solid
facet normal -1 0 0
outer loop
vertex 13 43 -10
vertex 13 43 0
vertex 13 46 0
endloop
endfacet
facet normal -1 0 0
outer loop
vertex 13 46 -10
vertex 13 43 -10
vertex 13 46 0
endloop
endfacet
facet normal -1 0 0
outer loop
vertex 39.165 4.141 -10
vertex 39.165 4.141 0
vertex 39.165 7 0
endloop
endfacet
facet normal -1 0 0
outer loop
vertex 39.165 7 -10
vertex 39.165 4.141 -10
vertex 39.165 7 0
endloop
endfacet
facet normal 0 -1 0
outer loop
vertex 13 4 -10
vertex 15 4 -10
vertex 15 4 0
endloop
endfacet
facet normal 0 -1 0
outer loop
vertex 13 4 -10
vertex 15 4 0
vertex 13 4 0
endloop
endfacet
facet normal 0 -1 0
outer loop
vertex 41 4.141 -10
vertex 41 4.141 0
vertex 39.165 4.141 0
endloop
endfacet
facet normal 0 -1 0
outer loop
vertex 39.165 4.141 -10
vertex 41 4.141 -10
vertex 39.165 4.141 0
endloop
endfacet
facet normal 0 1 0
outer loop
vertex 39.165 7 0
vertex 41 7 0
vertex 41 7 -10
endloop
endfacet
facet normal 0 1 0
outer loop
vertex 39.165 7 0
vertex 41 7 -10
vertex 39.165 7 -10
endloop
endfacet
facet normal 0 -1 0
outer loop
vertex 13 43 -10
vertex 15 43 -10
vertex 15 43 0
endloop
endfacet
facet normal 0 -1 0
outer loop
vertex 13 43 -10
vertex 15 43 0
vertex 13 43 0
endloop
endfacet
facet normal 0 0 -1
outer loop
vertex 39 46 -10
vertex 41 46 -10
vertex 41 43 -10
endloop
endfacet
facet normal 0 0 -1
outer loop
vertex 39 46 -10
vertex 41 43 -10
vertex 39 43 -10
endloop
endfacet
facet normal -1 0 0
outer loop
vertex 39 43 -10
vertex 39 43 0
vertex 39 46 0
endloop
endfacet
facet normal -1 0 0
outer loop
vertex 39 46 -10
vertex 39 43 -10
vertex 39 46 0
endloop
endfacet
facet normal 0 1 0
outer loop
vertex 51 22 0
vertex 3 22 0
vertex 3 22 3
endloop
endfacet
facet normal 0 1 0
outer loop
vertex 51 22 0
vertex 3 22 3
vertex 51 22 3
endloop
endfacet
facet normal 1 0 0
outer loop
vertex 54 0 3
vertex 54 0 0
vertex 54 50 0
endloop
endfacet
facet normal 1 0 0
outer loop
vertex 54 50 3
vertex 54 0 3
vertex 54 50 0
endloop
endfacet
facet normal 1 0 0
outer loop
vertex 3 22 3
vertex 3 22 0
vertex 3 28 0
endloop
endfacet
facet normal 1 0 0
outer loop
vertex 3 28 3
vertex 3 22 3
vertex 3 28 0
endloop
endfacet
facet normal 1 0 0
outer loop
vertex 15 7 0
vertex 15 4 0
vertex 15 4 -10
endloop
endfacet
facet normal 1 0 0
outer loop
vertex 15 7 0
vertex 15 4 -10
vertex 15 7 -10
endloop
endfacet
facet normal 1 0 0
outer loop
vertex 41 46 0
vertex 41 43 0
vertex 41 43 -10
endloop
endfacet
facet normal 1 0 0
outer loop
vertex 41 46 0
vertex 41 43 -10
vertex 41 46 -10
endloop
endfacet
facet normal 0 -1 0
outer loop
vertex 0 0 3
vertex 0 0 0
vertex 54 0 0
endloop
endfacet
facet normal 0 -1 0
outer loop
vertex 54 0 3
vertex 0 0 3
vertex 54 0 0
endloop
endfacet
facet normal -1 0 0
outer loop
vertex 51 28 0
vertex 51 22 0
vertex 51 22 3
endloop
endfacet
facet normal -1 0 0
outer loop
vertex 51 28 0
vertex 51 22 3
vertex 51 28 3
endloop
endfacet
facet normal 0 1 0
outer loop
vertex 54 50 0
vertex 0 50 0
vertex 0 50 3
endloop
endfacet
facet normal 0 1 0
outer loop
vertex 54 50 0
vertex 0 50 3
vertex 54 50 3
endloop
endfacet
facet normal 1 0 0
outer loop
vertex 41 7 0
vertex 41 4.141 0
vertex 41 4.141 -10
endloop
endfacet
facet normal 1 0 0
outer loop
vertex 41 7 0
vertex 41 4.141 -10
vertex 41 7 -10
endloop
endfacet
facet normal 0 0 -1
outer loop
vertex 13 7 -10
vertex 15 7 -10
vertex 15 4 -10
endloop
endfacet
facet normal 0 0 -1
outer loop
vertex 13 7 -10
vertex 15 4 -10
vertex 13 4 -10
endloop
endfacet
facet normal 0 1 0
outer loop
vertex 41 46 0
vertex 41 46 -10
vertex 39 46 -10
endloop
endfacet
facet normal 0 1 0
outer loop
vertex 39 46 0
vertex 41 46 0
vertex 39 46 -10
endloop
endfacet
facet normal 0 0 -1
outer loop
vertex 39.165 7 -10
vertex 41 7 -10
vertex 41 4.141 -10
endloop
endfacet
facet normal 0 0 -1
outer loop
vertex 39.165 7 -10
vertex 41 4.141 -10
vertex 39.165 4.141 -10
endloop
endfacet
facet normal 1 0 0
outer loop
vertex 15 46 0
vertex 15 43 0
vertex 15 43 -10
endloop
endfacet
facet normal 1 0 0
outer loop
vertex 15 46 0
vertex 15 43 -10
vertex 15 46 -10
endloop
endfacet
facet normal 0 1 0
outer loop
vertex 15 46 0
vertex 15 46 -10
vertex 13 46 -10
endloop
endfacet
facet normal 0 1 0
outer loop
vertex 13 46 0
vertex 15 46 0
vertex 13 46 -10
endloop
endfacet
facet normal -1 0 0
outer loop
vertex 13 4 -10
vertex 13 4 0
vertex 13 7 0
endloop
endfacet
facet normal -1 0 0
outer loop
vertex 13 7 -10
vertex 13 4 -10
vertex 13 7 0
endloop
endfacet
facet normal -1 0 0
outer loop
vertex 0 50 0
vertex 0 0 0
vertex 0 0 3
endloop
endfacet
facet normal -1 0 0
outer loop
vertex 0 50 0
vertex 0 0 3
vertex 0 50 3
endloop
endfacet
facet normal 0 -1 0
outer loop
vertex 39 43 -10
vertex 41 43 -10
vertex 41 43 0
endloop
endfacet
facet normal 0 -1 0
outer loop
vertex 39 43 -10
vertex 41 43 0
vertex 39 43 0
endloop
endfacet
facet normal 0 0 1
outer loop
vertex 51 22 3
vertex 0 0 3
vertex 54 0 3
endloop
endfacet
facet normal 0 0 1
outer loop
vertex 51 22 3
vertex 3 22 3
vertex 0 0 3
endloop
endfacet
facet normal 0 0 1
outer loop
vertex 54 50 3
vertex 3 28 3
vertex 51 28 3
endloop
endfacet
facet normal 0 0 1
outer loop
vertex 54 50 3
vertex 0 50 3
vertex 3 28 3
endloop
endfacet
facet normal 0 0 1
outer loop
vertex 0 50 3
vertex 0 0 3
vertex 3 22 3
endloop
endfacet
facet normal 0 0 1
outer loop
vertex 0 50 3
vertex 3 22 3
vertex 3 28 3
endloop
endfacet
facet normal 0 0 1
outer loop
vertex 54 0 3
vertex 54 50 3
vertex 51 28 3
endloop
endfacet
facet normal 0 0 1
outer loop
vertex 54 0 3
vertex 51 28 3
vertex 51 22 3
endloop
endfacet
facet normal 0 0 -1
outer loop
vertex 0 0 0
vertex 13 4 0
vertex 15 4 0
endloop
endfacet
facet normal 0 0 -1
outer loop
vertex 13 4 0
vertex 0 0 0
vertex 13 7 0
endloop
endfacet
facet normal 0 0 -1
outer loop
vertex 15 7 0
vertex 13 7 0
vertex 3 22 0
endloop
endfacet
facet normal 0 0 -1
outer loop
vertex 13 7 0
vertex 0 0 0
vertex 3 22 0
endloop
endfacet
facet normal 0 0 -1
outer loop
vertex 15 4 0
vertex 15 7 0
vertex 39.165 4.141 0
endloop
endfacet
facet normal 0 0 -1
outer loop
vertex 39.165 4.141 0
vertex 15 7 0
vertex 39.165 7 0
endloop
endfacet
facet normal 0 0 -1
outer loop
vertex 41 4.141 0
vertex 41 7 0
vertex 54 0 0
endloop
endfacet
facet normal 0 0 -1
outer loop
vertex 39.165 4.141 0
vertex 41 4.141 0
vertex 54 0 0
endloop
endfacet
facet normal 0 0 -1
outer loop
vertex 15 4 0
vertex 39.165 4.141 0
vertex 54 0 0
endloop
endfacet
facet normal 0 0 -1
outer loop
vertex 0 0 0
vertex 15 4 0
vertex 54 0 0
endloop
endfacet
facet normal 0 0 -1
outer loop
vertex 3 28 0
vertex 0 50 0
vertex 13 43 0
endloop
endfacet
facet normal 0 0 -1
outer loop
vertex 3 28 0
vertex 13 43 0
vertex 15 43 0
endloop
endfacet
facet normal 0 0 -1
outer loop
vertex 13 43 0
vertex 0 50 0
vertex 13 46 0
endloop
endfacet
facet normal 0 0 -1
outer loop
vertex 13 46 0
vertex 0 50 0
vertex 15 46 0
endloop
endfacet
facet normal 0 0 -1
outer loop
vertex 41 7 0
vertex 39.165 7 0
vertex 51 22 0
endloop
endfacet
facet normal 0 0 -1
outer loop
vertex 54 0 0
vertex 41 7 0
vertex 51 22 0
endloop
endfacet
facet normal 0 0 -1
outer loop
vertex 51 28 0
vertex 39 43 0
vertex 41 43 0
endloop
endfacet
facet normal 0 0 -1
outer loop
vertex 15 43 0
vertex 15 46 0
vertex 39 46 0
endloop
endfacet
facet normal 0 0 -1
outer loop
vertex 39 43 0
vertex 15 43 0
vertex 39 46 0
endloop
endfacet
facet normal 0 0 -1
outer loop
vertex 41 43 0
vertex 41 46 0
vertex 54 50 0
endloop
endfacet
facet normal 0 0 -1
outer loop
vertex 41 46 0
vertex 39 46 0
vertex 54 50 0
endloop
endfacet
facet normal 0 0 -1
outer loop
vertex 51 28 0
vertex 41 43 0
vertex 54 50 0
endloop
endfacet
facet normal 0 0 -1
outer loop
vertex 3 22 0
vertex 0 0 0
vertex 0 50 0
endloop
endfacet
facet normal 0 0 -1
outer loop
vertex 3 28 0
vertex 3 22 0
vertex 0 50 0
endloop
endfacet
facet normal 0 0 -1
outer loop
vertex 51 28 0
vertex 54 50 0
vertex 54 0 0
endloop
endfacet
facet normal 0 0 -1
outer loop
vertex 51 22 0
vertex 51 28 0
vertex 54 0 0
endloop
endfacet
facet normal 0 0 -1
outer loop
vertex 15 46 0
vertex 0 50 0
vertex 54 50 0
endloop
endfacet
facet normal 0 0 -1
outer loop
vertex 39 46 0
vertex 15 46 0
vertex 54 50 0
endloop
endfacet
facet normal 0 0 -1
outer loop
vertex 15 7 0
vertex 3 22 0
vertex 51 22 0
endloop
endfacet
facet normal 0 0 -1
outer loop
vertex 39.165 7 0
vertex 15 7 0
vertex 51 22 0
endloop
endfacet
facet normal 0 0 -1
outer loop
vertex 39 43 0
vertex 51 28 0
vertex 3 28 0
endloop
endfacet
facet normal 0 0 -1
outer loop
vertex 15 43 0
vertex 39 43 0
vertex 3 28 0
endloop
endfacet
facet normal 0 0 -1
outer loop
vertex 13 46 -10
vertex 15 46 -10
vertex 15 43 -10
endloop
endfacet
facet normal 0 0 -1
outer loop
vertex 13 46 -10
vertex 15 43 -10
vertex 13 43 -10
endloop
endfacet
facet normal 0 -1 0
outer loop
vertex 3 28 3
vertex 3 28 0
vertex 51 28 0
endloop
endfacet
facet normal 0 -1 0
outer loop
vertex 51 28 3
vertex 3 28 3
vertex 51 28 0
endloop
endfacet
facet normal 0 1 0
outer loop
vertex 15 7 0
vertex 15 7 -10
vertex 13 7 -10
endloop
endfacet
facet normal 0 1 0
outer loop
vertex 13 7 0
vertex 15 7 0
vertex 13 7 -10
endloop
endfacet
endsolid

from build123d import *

# Parameters (mm, degrees)
SKETCH1_W           = 54
SKETCH1_H           = 50
SKETCH1_W_2         = 48
SKETCH1_H_2         = 6
BOSS_EXTRUDE1_DEPTH = 3
SKETCH2_W           = 2
SKETCH2_H           = 3
SKETCH2_W_2         = 1.834512626
SKETCH2_H_2         = 2.85876986
BOSS_EXTRUDE2_DEPTH = 10


with BuildPart() as part:
    # Sketch1 → Boss-Extrude1 (new body)
    with BuildSketch(Plane.XY):
        with Locations((27, 25)):
            Rectangle(SKETCH1_W, SKETCH1_H)
        with Locations((27, 25)):
            Rectangle(SKETCH1_W_2, SKETCH1_H_2, mode=Mode.SUBTRACT)
    extrude(amount=BOSS_EXTRUDE1_DEPTH)

    # Sketch2 → Boss-Extrude2 (add)
    with BuildSketch(Plane(origin=(0, 0, 0), x_dir=(-1, 0, 0), z_dir=(0, 0, -1))):
        with Locations((-40, 44.5)):
            Rectangle(SKETCH2_W, SKETCH2_H)
        with Locations((-14, 44.5)):
            Rectangle(SKETCH2_W, SKETCH2_H)
        with Locations((-40.082743687, 5.57061507)):
            Rectangle(SKETCH2_W_2, SKETCH2_H_2)
        with Locations((-14, 5.5)):
            Rectangle(SKETCH2_W, SKETCH2_H)
    extrude(amount=BOSS_EXTRUDE2_DEPTH)


solid = part.part
